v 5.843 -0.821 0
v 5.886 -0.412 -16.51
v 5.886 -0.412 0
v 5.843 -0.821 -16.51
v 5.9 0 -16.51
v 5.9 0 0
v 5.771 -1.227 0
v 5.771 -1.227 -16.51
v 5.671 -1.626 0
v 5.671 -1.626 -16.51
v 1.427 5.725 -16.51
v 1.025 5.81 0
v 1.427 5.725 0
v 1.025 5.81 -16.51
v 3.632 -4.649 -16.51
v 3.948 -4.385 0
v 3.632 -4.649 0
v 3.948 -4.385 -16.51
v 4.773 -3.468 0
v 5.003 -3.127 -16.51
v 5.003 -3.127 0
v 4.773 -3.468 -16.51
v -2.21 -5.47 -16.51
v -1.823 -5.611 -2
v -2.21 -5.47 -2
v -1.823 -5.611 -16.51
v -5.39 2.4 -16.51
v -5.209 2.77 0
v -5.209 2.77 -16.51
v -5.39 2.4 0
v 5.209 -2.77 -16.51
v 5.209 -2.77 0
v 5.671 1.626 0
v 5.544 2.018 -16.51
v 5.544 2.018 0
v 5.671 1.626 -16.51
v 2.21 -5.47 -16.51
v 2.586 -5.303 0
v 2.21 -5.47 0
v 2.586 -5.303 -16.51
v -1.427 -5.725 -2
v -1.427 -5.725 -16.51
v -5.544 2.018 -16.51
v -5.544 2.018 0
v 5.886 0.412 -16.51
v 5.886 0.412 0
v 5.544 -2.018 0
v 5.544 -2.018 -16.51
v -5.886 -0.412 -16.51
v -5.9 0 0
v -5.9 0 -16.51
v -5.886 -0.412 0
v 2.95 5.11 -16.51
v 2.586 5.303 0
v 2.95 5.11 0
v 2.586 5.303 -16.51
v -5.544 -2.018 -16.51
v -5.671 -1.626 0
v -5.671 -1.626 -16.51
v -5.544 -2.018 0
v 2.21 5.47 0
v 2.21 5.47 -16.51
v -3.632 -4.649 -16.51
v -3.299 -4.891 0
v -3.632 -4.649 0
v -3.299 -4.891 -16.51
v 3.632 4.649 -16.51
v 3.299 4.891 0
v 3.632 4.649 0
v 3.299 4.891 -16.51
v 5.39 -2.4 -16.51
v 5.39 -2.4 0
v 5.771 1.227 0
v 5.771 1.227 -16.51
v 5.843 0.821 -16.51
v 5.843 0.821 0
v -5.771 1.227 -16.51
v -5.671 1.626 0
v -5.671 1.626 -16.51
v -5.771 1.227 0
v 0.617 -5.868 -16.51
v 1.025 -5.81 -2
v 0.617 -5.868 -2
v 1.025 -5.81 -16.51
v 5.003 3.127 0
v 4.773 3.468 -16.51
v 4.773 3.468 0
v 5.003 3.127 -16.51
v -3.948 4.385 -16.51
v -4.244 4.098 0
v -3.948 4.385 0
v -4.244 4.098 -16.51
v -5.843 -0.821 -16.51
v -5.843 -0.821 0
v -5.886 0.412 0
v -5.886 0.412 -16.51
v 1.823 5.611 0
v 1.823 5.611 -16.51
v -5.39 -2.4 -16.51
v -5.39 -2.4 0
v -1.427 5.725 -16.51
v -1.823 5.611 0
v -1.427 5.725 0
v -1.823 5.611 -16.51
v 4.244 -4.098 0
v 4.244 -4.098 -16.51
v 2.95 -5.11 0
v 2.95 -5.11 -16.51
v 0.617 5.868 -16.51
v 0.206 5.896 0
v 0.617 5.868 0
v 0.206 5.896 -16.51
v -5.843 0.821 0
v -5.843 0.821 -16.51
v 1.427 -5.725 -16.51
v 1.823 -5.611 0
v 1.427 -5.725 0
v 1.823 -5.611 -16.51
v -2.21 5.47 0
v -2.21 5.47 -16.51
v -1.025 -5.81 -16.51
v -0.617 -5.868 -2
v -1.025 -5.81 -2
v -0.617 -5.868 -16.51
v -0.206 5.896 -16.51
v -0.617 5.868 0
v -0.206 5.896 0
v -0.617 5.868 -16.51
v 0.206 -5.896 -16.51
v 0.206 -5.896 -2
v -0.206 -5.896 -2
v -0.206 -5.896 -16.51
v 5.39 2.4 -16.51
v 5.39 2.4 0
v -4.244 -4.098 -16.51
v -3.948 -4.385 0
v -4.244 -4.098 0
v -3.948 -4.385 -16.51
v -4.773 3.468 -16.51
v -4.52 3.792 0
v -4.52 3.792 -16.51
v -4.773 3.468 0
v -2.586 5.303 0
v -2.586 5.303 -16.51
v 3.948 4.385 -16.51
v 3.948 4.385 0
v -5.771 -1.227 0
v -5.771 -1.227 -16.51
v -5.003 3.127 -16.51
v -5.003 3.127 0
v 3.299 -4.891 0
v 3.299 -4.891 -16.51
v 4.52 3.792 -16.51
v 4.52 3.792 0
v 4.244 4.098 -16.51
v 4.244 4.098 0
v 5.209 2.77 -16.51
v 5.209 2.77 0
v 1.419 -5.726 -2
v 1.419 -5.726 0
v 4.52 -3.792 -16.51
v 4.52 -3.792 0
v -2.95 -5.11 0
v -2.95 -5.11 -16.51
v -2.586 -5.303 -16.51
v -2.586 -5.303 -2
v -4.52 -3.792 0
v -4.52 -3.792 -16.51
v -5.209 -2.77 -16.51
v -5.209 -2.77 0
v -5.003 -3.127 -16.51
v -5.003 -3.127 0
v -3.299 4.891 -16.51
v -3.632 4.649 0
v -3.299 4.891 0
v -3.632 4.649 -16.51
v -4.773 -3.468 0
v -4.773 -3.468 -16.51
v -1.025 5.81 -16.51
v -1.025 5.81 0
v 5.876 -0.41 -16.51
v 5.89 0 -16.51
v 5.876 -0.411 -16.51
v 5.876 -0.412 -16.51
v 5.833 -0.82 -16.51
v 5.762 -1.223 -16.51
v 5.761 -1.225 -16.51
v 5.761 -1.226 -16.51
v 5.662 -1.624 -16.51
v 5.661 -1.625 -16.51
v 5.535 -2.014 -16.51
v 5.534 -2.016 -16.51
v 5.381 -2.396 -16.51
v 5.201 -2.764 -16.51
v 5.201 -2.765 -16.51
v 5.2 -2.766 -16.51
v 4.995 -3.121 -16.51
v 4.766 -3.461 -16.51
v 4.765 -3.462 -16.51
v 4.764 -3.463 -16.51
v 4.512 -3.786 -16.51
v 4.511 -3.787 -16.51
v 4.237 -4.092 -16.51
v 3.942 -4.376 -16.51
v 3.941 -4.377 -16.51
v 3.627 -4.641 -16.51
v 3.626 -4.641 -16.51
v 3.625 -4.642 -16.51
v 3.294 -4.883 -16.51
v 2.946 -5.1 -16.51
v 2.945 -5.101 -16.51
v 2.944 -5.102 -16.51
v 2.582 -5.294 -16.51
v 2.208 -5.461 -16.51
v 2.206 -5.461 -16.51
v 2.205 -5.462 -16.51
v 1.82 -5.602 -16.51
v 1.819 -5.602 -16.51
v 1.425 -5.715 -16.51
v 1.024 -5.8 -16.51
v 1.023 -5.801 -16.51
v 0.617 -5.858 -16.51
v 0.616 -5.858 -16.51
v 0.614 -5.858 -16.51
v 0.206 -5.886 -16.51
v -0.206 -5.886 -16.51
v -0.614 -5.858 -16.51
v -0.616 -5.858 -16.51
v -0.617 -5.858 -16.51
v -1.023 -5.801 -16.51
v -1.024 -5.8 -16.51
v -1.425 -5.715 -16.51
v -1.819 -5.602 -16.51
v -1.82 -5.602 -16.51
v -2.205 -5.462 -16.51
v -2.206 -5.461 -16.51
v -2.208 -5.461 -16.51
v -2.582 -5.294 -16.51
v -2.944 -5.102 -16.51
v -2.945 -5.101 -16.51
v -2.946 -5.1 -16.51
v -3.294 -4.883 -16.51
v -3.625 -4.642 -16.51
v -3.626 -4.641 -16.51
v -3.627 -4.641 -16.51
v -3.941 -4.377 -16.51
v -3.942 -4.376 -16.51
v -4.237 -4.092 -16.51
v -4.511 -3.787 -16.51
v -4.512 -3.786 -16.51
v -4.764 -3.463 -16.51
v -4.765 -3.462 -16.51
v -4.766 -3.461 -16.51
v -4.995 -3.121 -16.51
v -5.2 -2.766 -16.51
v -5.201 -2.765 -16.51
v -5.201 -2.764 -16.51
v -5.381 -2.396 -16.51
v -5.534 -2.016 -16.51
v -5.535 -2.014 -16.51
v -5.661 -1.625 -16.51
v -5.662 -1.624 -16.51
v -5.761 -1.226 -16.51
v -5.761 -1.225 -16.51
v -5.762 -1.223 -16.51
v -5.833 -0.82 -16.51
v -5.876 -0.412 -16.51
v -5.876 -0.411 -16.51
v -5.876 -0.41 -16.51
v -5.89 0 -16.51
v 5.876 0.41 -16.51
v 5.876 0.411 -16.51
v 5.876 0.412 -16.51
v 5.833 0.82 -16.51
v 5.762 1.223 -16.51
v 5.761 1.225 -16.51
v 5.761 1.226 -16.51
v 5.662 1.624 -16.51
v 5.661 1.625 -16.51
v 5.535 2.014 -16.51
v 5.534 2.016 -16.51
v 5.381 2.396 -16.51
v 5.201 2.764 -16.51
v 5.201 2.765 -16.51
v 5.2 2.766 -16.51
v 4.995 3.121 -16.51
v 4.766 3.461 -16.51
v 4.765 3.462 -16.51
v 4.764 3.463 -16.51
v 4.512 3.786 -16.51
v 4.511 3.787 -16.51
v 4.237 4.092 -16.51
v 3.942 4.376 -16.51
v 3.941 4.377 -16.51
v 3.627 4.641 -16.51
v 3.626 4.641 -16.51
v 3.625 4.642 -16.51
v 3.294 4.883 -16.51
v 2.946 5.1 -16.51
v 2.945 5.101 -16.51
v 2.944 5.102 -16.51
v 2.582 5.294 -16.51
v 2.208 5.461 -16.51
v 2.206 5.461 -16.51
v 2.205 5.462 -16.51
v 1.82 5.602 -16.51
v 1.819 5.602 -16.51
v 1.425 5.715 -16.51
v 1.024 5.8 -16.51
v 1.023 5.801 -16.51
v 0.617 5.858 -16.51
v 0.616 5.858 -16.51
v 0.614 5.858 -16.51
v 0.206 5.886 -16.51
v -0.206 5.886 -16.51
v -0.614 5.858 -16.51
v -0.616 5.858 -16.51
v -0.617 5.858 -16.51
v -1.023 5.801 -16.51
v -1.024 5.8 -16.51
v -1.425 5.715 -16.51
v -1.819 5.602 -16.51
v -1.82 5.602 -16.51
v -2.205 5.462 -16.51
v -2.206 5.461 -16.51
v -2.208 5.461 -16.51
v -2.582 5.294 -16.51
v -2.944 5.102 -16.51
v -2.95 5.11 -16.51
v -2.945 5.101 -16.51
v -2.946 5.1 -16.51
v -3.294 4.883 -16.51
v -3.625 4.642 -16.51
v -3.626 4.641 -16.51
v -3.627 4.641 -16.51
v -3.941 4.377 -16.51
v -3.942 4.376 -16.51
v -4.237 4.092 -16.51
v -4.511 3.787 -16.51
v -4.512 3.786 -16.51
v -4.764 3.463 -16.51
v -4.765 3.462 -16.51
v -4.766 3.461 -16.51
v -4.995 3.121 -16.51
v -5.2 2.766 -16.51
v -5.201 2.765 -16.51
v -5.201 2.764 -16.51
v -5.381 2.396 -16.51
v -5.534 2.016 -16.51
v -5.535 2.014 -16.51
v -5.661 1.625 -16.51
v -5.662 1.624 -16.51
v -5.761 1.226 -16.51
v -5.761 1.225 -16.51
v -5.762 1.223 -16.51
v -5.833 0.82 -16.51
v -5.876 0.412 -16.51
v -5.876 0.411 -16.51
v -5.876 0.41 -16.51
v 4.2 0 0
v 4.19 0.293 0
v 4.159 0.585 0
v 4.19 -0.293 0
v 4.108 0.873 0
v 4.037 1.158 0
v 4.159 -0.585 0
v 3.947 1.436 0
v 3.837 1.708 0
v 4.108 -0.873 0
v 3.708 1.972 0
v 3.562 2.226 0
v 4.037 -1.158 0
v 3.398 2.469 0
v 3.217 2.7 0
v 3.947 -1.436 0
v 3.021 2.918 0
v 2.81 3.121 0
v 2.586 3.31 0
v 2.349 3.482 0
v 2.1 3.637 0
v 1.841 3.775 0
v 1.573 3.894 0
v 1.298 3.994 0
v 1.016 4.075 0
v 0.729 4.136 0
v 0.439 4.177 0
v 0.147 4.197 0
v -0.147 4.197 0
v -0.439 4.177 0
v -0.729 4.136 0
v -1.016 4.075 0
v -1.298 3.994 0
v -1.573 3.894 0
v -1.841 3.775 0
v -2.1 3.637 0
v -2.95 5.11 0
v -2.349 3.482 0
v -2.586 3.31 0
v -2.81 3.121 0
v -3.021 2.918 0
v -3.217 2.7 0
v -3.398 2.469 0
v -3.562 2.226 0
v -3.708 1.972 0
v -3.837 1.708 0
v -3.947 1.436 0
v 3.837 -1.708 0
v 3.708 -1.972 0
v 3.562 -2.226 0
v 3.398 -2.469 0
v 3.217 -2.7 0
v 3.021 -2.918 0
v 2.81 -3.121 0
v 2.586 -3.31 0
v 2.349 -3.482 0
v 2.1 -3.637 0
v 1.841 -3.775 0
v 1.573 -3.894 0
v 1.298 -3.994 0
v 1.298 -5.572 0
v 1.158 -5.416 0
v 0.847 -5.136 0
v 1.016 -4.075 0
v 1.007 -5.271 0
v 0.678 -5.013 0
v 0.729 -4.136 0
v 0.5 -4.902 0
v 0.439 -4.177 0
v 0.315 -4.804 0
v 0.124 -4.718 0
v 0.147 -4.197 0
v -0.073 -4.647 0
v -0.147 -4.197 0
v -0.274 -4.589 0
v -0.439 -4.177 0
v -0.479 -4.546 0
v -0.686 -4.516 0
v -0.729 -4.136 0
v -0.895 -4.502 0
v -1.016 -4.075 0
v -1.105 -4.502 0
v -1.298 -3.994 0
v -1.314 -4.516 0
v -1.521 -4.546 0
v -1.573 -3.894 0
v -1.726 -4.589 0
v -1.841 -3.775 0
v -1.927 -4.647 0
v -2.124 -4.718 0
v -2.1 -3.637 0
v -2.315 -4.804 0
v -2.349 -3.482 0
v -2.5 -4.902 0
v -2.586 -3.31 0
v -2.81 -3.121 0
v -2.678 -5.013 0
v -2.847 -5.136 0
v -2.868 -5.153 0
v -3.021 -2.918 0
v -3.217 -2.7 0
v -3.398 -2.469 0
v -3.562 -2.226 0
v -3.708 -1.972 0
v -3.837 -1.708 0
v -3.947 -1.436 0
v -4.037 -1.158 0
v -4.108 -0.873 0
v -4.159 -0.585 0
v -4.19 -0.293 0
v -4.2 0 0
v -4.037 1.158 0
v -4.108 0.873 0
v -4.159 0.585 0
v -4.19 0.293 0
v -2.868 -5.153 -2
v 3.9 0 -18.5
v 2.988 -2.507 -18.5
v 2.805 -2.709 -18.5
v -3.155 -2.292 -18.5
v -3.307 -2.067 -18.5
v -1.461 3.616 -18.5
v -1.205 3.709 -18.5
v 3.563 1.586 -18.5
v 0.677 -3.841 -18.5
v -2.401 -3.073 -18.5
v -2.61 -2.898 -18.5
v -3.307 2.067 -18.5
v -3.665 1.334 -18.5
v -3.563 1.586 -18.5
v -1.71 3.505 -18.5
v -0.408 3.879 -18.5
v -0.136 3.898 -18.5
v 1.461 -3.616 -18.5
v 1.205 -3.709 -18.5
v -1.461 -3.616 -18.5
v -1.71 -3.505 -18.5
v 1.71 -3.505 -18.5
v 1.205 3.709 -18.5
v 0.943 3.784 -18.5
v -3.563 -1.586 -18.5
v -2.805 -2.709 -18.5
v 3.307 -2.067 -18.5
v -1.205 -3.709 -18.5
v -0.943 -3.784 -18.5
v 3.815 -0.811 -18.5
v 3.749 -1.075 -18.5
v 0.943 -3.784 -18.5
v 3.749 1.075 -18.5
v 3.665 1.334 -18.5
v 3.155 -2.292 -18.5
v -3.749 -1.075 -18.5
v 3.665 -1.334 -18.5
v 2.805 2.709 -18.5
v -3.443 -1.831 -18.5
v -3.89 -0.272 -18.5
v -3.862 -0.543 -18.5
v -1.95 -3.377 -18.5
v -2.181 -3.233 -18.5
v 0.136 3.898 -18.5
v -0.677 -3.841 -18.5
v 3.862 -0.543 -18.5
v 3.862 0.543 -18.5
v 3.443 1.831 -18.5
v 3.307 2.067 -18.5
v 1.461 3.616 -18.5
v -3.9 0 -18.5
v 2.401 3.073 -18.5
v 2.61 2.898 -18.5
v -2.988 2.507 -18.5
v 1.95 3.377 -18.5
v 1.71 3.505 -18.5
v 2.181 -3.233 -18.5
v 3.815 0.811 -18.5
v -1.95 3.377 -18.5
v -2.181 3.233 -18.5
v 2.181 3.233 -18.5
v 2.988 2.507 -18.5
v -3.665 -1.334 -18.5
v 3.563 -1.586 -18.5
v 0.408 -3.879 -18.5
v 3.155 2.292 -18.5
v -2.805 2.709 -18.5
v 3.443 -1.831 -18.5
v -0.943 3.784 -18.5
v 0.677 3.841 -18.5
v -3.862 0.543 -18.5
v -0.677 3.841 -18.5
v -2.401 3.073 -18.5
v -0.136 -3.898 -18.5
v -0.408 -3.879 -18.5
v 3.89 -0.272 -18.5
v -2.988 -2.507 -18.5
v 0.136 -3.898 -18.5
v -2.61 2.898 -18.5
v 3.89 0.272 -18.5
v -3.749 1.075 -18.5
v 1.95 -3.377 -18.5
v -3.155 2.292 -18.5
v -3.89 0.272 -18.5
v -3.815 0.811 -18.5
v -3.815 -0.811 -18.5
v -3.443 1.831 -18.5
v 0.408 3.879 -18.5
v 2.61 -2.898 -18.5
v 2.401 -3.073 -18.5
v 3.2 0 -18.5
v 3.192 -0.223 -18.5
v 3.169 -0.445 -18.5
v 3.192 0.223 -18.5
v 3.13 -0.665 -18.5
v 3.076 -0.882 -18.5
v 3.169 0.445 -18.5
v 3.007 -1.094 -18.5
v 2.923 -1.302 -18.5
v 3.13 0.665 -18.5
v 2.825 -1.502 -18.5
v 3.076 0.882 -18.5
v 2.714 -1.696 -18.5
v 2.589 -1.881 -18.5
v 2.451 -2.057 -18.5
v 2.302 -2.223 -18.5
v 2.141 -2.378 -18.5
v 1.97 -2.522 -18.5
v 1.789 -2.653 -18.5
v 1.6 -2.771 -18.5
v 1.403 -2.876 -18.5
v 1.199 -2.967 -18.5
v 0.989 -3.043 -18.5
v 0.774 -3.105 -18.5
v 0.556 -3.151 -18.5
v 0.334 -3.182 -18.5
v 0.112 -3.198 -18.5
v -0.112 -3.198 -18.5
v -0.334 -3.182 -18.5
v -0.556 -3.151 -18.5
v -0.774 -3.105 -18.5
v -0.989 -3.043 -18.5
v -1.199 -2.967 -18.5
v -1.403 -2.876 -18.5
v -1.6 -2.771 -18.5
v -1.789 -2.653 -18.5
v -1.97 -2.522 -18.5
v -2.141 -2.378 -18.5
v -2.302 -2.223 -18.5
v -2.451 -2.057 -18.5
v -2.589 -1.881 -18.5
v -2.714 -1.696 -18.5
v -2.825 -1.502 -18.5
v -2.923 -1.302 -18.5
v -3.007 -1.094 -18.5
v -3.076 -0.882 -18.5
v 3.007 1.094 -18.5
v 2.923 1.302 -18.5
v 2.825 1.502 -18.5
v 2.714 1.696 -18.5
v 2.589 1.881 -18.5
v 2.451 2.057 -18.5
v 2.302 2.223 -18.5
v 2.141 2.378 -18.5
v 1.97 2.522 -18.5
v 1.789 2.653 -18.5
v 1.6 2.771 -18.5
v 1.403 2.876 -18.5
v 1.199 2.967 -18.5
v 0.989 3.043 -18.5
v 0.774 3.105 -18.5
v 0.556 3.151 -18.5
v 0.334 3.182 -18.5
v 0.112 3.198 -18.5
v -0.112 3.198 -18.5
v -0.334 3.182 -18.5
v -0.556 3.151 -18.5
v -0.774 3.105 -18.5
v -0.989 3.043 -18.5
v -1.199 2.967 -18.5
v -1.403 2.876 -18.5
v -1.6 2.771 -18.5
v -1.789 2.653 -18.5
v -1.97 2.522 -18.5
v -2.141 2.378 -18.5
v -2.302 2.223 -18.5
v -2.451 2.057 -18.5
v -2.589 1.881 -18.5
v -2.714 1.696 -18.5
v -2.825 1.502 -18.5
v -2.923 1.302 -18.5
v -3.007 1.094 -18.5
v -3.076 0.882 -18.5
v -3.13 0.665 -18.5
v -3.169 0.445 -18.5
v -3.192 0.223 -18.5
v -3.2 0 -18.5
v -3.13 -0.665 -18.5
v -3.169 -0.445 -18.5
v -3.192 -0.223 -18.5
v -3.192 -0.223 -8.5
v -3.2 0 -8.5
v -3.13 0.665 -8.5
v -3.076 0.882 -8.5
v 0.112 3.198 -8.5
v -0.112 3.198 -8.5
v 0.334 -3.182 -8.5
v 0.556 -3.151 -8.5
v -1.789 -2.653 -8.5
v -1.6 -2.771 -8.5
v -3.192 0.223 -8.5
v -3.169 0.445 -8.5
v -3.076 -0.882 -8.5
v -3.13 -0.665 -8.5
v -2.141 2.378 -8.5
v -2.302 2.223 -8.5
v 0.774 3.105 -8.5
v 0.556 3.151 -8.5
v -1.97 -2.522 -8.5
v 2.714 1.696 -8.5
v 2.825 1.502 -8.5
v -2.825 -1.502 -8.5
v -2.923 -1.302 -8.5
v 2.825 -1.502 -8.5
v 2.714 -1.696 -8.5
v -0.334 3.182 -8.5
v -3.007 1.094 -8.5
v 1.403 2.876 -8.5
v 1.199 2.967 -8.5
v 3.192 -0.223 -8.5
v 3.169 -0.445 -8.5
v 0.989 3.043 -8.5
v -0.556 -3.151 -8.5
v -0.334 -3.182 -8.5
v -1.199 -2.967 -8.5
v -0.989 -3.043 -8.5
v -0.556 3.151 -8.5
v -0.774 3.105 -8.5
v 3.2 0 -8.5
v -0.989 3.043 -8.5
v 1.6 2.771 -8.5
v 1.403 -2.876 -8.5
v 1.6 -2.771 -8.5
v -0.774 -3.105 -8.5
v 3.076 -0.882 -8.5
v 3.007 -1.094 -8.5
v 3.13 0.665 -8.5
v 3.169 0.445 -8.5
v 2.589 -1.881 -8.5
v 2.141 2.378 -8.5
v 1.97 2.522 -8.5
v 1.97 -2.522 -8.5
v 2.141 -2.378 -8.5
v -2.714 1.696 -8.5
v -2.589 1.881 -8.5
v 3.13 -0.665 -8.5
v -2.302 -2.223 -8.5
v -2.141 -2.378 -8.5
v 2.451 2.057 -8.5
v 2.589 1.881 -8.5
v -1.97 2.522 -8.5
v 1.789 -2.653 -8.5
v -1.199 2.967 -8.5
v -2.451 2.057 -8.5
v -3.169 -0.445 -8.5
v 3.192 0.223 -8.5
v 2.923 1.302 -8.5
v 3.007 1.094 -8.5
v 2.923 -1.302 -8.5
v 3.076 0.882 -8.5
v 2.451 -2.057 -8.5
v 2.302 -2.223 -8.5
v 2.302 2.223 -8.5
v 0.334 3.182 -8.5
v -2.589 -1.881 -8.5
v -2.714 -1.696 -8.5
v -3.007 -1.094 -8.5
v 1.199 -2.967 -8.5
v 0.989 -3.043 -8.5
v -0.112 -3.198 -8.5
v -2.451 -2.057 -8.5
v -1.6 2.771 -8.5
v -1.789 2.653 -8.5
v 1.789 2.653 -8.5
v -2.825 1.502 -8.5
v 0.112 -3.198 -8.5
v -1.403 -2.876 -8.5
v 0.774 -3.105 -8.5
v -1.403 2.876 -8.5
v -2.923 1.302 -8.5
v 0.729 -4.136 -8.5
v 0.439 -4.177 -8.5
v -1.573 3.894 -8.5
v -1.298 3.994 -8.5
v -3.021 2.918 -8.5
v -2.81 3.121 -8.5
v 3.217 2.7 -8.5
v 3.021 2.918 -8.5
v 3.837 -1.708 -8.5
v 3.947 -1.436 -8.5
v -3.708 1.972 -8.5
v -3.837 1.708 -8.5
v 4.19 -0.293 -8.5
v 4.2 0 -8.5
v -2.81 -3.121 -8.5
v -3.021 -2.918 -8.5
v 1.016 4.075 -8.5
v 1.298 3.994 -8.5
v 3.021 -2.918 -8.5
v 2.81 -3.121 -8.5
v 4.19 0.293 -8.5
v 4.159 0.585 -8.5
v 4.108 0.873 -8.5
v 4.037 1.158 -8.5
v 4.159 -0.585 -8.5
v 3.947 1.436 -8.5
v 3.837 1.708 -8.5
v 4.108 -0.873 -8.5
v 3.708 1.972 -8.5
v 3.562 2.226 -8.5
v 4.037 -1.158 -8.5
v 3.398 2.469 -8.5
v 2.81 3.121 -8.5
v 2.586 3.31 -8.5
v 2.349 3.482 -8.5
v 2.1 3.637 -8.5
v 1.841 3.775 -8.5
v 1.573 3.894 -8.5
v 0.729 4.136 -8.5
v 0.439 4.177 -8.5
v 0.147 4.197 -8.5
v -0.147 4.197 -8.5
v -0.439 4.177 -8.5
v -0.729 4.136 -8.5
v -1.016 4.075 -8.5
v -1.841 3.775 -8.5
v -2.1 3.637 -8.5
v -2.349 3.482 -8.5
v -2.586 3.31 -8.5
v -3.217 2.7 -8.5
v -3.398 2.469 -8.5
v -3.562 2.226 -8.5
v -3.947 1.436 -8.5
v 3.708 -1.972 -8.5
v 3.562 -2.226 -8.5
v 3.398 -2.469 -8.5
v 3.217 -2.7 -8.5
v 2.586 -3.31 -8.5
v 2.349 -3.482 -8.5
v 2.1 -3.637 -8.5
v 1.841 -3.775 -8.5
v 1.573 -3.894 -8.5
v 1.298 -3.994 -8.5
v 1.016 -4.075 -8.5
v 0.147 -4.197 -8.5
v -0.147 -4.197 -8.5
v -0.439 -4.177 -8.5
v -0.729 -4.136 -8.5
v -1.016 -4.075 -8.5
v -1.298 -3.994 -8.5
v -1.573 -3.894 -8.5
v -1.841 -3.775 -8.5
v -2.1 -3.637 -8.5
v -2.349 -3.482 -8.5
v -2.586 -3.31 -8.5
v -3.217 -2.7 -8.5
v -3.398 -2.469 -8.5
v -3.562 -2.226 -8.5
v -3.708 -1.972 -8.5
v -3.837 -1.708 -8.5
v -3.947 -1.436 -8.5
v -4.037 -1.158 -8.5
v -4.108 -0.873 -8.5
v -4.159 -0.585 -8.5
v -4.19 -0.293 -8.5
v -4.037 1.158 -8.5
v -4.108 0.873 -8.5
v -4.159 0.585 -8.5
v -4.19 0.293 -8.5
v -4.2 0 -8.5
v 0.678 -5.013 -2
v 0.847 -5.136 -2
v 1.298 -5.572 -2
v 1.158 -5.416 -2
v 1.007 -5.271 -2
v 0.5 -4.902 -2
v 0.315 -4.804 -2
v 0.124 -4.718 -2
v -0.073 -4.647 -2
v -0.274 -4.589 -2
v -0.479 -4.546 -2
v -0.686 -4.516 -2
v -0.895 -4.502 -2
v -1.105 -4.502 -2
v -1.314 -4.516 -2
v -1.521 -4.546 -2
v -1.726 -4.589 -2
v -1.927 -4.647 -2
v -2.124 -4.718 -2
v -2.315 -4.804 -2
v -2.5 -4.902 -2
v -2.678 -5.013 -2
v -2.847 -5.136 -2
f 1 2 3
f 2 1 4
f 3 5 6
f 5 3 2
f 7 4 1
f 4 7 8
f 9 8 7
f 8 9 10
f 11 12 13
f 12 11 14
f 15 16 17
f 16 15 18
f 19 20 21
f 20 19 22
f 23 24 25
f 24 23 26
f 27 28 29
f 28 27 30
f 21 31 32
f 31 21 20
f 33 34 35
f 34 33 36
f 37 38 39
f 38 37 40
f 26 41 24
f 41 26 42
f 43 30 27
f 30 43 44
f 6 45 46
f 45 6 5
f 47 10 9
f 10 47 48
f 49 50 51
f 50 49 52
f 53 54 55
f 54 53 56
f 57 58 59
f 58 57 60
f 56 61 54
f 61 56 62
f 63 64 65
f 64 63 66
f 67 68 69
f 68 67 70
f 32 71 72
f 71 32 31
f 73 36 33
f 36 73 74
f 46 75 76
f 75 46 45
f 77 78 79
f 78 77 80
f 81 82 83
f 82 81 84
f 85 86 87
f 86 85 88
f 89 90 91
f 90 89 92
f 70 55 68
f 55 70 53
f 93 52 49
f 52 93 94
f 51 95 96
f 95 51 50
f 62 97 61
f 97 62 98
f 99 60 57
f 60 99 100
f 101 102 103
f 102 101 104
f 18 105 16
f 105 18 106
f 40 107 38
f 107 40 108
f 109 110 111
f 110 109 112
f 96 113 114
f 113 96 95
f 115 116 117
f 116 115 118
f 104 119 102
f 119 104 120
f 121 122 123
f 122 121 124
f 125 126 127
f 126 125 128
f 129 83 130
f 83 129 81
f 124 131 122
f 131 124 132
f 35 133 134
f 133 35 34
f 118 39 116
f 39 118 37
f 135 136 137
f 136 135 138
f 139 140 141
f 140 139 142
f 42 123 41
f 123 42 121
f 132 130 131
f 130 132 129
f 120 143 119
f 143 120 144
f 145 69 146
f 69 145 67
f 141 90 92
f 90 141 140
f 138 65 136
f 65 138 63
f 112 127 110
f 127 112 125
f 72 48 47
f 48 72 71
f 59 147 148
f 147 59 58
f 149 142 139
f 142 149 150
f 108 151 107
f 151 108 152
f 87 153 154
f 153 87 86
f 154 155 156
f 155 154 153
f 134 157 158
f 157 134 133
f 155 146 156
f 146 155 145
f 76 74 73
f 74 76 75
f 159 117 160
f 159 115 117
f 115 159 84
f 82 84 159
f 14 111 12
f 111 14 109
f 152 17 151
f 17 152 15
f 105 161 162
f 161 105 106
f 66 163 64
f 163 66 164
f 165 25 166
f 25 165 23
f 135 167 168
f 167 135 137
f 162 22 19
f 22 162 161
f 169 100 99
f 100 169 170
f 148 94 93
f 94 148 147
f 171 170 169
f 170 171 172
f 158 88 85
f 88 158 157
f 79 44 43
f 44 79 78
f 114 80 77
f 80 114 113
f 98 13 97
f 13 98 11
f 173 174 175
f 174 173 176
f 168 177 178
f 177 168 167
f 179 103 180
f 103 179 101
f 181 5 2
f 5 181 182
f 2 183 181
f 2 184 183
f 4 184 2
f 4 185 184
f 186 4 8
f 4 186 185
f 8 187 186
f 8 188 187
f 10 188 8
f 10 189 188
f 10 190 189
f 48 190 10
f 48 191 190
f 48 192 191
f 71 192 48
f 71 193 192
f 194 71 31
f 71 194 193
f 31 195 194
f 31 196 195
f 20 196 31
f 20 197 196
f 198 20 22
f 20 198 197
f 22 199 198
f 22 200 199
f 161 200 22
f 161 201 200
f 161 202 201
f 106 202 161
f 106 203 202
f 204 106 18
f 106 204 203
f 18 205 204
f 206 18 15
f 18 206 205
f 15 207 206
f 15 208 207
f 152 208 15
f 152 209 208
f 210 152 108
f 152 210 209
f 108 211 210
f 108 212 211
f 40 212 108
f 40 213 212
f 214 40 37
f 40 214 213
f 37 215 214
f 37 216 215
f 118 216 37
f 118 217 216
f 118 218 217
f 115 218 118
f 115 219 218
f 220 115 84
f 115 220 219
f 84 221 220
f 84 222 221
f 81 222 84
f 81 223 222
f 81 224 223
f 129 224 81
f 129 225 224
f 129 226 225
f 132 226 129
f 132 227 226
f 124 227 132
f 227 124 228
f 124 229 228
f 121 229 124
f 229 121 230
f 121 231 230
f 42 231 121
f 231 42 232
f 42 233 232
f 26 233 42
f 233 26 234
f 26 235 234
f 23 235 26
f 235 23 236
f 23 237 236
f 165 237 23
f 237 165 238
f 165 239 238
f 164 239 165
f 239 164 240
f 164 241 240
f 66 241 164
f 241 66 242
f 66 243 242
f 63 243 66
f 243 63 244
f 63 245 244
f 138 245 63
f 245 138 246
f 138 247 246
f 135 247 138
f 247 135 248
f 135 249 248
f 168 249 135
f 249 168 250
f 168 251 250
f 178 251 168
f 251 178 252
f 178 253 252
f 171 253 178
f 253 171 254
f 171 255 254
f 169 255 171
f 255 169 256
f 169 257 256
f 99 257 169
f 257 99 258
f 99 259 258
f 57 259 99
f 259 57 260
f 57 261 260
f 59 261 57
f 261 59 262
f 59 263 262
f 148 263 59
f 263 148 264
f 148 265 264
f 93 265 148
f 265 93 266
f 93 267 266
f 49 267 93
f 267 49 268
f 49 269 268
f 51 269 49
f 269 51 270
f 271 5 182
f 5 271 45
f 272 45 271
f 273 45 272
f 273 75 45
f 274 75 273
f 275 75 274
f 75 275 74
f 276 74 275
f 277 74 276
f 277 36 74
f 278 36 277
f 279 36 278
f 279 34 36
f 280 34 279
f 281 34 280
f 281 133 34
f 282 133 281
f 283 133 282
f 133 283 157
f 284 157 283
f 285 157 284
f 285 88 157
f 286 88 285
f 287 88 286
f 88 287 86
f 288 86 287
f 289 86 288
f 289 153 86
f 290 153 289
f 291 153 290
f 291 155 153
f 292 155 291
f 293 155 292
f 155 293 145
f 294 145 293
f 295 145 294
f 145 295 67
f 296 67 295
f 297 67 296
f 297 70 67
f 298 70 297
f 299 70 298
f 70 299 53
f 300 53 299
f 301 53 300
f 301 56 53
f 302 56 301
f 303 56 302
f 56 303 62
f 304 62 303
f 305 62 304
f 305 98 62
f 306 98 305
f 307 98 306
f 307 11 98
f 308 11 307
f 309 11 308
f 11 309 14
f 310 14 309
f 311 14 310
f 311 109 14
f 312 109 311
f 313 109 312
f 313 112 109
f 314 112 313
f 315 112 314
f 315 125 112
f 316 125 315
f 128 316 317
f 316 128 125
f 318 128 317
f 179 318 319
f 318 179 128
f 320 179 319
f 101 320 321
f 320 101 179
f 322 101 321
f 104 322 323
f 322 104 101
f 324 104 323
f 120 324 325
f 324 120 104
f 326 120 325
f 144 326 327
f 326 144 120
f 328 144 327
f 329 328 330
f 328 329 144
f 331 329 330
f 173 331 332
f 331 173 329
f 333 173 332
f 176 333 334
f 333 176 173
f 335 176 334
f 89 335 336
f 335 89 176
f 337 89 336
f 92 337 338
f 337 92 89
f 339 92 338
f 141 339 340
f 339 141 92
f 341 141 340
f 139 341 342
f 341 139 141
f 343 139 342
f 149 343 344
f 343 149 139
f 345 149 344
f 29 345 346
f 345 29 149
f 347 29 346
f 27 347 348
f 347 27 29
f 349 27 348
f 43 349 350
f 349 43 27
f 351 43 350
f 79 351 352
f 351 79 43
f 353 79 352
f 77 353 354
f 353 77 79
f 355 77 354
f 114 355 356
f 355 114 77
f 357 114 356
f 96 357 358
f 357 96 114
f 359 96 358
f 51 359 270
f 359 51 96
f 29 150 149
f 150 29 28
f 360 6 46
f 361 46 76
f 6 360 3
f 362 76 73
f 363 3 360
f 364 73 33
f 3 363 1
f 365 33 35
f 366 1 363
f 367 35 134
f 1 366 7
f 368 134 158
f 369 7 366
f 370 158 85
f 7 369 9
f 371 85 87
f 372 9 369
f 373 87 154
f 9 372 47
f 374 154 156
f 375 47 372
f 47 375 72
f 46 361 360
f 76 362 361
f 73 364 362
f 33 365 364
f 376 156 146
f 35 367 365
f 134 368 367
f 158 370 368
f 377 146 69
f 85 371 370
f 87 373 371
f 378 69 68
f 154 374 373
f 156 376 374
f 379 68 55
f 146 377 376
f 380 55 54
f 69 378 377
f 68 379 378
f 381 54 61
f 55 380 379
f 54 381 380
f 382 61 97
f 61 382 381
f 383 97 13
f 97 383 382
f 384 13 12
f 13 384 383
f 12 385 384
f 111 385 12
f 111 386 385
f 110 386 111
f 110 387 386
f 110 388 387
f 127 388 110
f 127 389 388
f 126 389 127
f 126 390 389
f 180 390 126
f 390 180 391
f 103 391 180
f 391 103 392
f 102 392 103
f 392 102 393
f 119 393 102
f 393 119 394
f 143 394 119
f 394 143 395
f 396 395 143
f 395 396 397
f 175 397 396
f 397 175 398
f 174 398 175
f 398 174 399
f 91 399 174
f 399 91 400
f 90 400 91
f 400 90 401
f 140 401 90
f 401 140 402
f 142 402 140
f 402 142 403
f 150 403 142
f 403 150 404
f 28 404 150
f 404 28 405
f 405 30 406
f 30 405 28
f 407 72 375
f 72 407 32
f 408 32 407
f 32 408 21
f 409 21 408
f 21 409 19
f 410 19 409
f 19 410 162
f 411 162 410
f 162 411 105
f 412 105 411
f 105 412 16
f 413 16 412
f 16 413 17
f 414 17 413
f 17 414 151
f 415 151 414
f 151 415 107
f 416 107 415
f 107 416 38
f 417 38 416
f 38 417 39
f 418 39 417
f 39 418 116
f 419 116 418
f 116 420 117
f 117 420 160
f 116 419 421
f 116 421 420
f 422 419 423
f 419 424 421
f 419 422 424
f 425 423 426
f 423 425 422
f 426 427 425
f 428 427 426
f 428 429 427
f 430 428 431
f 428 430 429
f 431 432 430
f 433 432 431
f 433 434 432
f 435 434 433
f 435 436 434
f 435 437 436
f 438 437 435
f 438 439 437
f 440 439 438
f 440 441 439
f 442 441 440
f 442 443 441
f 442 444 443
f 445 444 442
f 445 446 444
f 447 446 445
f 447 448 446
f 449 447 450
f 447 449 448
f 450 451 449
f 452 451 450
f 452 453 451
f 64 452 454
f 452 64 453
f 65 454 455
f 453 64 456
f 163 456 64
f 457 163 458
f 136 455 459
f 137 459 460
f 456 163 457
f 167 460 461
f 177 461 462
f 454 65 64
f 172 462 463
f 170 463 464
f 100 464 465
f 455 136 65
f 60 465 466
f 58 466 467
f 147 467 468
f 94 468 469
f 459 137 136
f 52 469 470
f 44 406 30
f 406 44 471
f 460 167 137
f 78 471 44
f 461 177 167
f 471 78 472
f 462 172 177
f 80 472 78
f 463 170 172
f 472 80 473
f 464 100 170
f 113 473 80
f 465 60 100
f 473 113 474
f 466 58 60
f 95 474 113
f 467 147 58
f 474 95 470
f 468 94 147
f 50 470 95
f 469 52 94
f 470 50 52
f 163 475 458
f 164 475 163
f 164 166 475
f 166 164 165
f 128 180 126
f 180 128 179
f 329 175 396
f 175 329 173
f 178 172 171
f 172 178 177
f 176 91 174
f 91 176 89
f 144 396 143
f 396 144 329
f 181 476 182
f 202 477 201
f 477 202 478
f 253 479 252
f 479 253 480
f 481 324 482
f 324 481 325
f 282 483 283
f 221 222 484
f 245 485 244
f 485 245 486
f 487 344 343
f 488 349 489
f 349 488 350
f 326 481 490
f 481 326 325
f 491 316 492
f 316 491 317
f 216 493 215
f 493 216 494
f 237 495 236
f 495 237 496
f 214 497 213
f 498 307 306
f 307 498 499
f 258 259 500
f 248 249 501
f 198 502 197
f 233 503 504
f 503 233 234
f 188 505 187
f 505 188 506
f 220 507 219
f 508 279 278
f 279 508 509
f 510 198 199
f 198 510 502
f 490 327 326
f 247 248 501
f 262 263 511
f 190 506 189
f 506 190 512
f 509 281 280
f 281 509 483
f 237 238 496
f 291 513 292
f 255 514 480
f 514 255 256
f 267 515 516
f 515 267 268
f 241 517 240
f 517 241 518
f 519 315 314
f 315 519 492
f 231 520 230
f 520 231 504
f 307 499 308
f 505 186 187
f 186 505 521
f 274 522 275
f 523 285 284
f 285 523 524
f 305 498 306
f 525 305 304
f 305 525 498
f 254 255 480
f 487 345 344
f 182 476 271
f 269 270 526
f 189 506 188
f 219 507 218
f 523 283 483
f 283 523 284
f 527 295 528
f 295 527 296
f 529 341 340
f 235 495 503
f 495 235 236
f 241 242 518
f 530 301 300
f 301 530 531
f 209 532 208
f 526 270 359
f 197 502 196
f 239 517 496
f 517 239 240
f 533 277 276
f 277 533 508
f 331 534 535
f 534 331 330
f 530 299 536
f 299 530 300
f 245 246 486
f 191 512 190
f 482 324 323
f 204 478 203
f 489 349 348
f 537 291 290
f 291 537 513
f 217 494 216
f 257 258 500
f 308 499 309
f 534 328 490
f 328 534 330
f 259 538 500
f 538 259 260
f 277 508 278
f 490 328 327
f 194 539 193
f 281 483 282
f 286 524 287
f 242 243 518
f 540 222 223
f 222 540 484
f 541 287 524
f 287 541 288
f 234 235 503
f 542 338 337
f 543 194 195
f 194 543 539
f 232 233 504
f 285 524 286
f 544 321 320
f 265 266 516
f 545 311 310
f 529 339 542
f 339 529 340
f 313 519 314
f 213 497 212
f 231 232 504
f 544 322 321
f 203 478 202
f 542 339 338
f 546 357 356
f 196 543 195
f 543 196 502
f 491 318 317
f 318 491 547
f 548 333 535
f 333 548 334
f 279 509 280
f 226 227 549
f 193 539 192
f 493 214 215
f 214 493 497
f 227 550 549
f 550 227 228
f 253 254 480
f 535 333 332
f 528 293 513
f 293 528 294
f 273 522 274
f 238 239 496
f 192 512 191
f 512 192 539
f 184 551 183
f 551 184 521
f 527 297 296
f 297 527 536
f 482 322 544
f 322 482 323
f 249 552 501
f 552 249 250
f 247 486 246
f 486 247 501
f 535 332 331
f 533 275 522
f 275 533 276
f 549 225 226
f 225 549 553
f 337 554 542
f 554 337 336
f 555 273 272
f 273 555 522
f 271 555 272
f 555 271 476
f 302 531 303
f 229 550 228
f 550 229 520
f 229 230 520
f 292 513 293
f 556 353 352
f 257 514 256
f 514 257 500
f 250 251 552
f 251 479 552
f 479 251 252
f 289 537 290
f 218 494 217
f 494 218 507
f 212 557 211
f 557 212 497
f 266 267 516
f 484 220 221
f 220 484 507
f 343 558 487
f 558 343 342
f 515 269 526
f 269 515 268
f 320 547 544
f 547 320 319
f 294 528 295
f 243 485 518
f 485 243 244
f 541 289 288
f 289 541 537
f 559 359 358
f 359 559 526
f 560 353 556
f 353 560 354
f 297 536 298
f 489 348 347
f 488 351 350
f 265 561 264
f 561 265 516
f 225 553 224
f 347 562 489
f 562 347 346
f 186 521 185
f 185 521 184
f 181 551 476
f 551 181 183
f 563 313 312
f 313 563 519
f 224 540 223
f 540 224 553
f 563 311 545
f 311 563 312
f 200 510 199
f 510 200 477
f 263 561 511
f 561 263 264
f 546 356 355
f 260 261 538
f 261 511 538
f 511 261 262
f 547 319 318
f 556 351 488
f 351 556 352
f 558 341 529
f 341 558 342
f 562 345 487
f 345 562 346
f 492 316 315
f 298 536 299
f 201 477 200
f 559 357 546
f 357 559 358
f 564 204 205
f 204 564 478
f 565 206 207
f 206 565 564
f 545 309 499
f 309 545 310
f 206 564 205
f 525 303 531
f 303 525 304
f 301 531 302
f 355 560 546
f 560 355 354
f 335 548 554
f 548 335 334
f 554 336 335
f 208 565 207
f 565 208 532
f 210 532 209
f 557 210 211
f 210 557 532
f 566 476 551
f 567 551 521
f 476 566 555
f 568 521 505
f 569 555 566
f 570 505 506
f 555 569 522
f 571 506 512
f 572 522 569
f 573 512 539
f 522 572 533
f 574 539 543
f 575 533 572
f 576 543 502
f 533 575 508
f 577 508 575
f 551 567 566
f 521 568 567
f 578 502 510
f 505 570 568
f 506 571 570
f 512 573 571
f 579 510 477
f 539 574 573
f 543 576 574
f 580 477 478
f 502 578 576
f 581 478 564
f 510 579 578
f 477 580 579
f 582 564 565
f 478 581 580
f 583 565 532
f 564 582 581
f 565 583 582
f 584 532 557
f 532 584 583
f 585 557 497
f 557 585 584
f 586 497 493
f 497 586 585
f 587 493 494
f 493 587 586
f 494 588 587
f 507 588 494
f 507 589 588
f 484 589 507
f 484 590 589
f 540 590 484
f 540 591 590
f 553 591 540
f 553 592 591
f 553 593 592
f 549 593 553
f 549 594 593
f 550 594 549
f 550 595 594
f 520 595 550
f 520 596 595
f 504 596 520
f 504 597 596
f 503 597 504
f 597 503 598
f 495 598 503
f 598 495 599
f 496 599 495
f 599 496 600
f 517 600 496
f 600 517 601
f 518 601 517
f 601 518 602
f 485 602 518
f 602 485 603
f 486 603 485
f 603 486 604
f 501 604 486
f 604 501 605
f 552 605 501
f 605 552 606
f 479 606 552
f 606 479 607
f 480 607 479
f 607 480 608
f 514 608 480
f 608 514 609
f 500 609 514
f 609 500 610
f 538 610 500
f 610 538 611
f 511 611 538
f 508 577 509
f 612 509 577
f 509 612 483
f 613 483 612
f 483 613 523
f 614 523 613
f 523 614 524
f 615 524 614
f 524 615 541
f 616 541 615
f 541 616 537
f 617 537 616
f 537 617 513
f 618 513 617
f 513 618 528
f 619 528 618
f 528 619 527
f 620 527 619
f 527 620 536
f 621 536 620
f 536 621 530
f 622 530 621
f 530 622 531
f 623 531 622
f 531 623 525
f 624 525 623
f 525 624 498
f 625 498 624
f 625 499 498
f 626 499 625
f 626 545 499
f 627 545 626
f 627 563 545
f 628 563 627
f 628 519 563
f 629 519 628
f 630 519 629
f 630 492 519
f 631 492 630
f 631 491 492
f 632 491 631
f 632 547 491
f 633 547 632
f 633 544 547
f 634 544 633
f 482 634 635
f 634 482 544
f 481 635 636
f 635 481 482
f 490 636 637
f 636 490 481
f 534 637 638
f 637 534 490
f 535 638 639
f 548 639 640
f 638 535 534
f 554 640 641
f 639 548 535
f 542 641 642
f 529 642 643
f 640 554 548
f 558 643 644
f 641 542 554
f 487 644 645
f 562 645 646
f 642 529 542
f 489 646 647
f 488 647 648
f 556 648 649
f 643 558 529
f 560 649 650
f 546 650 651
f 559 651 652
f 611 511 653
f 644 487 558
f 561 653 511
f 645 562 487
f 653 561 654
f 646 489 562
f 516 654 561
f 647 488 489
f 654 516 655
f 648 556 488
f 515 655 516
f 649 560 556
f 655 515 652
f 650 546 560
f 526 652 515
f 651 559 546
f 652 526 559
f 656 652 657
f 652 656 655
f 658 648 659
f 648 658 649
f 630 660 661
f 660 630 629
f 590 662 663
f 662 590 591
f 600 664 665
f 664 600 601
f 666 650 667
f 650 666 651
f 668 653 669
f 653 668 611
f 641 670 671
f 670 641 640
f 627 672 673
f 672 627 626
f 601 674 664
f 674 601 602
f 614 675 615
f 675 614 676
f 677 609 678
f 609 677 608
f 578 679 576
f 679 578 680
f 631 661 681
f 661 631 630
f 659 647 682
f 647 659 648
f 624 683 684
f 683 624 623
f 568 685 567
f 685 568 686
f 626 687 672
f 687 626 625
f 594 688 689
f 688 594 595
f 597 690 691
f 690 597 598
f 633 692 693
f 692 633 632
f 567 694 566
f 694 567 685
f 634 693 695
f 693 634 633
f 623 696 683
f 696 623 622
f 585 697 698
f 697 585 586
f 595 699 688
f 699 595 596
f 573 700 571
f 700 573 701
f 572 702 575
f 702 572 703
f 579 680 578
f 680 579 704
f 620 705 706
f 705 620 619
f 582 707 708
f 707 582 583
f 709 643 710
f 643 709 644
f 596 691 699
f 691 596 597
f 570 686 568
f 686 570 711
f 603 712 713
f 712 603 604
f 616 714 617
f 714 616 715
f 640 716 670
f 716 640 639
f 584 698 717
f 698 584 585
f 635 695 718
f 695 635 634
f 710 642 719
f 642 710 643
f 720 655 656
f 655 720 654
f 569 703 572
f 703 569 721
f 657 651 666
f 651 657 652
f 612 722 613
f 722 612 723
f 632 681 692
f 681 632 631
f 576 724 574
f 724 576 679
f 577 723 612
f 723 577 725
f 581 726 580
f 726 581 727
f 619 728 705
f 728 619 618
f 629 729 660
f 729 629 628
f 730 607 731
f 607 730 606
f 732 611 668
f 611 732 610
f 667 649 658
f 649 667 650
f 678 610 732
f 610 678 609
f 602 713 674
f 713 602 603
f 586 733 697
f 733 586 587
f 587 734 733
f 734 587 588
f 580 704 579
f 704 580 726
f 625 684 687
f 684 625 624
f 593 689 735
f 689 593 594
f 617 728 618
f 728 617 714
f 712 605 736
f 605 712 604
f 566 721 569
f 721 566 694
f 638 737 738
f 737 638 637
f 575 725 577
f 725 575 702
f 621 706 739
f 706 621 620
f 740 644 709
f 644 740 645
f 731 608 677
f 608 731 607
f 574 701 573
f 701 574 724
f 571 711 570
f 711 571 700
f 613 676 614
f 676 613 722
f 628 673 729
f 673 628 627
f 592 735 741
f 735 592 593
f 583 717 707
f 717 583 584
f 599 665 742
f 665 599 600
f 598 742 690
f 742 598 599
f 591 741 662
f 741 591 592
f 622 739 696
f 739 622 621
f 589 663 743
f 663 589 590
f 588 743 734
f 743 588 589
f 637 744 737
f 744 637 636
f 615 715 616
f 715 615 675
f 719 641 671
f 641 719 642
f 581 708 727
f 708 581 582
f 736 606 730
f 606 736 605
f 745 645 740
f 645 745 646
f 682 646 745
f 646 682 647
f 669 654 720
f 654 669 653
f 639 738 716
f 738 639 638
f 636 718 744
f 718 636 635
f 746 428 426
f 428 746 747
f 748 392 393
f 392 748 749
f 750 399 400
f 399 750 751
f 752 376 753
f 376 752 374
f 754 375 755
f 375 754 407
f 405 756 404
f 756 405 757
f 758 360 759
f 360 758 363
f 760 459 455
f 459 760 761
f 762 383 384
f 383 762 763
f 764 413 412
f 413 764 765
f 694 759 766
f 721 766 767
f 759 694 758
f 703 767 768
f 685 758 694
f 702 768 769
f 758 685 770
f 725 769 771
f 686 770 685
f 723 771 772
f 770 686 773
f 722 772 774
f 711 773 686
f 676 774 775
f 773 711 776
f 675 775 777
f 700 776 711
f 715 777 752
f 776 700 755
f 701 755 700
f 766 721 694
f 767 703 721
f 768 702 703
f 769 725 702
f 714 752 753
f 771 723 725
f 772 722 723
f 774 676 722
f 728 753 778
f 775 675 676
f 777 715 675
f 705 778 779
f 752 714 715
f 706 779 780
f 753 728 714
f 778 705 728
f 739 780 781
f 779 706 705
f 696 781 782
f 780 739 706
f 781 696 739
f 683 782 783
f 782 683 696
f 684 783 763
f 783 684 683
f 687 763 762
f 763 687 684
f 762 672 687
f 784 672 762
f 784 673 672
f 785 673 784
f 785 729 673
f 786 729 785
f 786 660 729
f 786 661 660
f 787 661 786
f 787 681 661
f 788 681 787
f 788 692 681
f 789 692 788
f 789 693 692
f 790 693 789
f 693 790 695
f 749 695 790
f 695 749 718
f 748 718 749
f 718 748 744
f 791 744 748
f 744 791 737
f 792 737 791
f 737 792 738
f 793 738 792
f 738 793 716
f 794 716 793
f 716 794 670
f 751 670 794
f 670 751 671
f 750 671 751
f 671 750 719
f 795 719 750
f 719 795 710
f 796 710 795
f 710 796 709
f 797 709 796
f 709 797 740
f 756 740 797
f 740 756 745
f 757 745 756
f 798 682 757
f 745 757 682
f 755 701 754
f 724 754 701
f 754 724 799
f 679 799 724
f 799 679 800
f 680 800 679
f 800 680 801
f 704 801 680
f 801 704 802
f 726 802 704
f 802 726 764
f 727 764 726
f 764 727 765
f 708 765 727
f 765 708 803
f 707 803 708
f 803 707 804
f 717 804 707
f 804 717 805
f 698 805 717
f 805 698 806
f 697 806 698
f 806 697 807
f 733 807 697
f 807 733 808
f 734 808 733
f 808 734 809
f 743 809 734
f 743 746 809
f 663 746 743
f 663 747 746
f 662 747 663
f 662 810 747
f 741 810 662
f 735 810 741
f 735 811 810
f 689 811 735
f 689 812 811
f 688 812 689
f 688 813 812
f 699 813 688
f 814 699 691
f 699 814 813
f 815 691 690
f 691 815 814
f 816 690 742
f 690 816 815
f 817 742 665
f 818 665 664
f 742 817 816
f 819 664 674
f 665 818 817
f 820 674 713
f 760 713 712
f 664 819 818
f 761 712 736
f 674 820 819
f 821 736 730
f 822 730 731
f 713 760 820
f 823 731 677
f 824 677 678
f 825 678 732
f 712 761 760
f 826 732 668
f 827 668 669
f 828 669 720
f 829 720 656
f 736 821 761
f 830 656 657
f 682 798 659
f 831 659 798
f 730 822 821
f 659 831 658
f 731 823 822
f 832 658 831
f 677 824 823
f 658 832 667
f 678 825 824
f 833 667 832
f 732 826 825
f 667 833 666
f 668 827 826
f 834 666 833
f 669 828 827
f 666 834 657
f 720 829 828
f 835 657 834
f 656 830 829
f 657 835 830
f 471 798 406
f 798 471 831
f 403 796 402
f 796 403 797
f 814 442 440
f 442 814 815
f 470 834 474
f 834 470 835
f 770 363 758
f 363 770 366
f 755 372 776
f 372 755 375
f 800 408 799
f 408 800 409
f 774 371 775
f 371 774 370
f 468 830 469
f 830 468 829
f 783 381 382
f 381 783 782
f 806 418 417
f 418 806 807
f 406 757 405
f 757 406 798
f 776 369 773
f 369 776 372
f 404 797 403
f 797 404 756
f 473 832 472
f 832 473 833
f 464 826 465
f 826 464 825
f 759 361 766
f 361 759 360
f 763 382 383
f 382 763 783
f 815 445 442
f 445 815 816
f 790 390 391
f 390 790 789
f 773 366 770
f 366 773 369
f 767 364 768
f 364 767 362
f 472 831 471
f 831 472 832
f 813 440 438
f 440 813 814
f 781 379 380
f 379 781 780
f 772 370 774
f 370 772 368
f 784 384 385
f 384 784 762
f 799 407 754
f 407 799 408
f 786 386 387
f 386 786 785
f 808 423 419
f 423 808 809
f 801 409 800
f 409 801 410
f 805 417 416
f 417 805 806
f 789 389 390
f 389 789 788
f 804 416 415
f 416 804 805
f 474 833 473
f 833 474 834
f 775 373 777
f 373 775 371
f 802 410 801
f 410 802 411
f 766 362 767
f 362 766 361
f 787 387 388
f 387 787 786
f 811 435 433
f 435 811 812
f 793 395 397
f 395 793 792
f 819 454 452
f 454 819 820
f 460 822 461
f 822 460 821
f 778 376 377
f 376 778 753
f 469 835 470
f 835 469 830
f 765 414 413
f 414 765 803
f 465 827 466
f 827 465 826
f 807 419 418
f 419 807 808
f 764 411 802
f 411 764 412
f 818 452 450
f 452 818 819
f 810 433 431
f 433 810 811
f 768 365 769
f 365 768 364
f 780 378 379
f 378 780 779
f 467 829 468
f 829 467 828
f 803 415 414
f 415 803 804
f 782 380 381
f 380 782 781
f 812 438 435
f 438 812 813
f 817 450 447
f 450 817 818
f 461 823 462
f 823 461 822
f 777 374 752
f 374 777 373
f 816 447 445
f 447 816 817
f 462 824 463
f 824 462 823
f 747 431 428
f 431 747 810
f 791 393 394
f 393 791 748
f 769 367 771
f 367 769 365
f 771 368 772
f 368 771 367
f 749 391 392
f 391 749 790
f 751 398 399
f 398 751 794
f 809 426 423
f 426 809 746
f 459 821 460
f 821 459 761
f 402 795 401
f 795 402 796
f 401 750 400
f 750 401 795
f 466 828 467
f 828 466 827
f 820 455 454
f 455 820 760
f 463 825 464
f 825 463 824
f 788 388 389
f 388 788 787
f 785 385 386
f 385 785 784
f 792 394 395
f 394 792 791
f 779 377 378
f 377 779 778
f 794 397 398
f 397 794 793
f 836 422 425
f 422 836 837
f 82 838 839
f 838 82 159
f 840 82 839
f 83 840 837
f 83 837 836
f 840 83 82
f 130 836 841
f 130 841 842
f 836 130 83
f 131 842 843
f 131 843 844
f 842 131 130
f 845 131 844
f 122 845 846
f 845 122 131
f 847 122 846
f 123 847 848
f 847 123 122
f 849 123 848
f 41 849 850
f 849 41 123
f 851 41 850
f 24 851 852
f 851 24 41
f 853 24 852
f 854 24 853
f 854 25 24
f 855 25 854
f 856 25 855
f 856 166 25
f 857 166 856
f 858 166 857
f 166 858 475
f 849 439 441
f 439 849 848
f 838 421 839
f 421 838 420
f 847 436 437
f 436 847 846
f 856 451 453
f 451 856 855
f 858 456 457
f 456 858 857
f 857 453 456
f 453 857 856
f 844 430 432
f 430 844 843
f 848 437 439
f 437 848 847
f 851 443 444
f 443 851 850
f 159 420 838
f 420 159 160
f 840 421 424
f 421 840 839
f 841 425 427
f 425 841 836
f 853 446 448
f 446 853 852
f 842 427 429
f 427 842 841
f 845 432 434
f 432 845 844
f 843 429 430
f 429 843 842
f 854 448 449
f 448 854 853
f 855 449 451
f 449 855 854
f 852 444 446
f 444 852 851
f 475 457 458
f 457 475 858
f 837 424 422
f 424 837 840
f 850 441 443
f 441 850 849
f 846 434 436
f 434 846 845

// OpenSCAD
// Prusa MK2.5/MK3 Filament Cover to Filament Tube Coupler
// v1.2, 20/6/2018 - Render/print upside down
// v1.1, 18/6/2018 - Added customiser
// by inks007
// This work is licensed under a Creative Commons Attribution-NonCommercial-ShareAlike 4.0 International License
// (CC BY-NC-SA 4.0)

//rotate([180,0,0]) translate([0,-17,-53]) import("PrusaMK3_filament-sensor-cover.stl",convexity=2);

// Filament tube push fit depth
coupler_ln = 10;
// Filament tube OD (dilate if required)
tube_od = 6.4;
tube_or = tube_od/2;
// Coupler OD
coupler_od = max(11.8,tube_od+5);
coupler_or = coupler_od/2;

/* [Hidden] */
$fn = 90;

rotate([180,0,0]) difference() {
	union() {
		cylinder(r=coupler_or,h=8.5+coupler_ln-1.99);
		translate([0,0,6.5+coupler_ln]) cylinder(r1=coupler_or,r2=coupler_or-2,h=2);
	}
	// Tube cutout
	translate([0,0,7.5]) cylinder(r=tube_or,h=coupler_ln+2);
	// Filament cover attachment
	translate([0,0,-1]) cylinder(r=8.4/2,h=9.5);
	// Screw cutout
	translate([-1,7.5,-1]) cylinder(r=3,h=3);
}
